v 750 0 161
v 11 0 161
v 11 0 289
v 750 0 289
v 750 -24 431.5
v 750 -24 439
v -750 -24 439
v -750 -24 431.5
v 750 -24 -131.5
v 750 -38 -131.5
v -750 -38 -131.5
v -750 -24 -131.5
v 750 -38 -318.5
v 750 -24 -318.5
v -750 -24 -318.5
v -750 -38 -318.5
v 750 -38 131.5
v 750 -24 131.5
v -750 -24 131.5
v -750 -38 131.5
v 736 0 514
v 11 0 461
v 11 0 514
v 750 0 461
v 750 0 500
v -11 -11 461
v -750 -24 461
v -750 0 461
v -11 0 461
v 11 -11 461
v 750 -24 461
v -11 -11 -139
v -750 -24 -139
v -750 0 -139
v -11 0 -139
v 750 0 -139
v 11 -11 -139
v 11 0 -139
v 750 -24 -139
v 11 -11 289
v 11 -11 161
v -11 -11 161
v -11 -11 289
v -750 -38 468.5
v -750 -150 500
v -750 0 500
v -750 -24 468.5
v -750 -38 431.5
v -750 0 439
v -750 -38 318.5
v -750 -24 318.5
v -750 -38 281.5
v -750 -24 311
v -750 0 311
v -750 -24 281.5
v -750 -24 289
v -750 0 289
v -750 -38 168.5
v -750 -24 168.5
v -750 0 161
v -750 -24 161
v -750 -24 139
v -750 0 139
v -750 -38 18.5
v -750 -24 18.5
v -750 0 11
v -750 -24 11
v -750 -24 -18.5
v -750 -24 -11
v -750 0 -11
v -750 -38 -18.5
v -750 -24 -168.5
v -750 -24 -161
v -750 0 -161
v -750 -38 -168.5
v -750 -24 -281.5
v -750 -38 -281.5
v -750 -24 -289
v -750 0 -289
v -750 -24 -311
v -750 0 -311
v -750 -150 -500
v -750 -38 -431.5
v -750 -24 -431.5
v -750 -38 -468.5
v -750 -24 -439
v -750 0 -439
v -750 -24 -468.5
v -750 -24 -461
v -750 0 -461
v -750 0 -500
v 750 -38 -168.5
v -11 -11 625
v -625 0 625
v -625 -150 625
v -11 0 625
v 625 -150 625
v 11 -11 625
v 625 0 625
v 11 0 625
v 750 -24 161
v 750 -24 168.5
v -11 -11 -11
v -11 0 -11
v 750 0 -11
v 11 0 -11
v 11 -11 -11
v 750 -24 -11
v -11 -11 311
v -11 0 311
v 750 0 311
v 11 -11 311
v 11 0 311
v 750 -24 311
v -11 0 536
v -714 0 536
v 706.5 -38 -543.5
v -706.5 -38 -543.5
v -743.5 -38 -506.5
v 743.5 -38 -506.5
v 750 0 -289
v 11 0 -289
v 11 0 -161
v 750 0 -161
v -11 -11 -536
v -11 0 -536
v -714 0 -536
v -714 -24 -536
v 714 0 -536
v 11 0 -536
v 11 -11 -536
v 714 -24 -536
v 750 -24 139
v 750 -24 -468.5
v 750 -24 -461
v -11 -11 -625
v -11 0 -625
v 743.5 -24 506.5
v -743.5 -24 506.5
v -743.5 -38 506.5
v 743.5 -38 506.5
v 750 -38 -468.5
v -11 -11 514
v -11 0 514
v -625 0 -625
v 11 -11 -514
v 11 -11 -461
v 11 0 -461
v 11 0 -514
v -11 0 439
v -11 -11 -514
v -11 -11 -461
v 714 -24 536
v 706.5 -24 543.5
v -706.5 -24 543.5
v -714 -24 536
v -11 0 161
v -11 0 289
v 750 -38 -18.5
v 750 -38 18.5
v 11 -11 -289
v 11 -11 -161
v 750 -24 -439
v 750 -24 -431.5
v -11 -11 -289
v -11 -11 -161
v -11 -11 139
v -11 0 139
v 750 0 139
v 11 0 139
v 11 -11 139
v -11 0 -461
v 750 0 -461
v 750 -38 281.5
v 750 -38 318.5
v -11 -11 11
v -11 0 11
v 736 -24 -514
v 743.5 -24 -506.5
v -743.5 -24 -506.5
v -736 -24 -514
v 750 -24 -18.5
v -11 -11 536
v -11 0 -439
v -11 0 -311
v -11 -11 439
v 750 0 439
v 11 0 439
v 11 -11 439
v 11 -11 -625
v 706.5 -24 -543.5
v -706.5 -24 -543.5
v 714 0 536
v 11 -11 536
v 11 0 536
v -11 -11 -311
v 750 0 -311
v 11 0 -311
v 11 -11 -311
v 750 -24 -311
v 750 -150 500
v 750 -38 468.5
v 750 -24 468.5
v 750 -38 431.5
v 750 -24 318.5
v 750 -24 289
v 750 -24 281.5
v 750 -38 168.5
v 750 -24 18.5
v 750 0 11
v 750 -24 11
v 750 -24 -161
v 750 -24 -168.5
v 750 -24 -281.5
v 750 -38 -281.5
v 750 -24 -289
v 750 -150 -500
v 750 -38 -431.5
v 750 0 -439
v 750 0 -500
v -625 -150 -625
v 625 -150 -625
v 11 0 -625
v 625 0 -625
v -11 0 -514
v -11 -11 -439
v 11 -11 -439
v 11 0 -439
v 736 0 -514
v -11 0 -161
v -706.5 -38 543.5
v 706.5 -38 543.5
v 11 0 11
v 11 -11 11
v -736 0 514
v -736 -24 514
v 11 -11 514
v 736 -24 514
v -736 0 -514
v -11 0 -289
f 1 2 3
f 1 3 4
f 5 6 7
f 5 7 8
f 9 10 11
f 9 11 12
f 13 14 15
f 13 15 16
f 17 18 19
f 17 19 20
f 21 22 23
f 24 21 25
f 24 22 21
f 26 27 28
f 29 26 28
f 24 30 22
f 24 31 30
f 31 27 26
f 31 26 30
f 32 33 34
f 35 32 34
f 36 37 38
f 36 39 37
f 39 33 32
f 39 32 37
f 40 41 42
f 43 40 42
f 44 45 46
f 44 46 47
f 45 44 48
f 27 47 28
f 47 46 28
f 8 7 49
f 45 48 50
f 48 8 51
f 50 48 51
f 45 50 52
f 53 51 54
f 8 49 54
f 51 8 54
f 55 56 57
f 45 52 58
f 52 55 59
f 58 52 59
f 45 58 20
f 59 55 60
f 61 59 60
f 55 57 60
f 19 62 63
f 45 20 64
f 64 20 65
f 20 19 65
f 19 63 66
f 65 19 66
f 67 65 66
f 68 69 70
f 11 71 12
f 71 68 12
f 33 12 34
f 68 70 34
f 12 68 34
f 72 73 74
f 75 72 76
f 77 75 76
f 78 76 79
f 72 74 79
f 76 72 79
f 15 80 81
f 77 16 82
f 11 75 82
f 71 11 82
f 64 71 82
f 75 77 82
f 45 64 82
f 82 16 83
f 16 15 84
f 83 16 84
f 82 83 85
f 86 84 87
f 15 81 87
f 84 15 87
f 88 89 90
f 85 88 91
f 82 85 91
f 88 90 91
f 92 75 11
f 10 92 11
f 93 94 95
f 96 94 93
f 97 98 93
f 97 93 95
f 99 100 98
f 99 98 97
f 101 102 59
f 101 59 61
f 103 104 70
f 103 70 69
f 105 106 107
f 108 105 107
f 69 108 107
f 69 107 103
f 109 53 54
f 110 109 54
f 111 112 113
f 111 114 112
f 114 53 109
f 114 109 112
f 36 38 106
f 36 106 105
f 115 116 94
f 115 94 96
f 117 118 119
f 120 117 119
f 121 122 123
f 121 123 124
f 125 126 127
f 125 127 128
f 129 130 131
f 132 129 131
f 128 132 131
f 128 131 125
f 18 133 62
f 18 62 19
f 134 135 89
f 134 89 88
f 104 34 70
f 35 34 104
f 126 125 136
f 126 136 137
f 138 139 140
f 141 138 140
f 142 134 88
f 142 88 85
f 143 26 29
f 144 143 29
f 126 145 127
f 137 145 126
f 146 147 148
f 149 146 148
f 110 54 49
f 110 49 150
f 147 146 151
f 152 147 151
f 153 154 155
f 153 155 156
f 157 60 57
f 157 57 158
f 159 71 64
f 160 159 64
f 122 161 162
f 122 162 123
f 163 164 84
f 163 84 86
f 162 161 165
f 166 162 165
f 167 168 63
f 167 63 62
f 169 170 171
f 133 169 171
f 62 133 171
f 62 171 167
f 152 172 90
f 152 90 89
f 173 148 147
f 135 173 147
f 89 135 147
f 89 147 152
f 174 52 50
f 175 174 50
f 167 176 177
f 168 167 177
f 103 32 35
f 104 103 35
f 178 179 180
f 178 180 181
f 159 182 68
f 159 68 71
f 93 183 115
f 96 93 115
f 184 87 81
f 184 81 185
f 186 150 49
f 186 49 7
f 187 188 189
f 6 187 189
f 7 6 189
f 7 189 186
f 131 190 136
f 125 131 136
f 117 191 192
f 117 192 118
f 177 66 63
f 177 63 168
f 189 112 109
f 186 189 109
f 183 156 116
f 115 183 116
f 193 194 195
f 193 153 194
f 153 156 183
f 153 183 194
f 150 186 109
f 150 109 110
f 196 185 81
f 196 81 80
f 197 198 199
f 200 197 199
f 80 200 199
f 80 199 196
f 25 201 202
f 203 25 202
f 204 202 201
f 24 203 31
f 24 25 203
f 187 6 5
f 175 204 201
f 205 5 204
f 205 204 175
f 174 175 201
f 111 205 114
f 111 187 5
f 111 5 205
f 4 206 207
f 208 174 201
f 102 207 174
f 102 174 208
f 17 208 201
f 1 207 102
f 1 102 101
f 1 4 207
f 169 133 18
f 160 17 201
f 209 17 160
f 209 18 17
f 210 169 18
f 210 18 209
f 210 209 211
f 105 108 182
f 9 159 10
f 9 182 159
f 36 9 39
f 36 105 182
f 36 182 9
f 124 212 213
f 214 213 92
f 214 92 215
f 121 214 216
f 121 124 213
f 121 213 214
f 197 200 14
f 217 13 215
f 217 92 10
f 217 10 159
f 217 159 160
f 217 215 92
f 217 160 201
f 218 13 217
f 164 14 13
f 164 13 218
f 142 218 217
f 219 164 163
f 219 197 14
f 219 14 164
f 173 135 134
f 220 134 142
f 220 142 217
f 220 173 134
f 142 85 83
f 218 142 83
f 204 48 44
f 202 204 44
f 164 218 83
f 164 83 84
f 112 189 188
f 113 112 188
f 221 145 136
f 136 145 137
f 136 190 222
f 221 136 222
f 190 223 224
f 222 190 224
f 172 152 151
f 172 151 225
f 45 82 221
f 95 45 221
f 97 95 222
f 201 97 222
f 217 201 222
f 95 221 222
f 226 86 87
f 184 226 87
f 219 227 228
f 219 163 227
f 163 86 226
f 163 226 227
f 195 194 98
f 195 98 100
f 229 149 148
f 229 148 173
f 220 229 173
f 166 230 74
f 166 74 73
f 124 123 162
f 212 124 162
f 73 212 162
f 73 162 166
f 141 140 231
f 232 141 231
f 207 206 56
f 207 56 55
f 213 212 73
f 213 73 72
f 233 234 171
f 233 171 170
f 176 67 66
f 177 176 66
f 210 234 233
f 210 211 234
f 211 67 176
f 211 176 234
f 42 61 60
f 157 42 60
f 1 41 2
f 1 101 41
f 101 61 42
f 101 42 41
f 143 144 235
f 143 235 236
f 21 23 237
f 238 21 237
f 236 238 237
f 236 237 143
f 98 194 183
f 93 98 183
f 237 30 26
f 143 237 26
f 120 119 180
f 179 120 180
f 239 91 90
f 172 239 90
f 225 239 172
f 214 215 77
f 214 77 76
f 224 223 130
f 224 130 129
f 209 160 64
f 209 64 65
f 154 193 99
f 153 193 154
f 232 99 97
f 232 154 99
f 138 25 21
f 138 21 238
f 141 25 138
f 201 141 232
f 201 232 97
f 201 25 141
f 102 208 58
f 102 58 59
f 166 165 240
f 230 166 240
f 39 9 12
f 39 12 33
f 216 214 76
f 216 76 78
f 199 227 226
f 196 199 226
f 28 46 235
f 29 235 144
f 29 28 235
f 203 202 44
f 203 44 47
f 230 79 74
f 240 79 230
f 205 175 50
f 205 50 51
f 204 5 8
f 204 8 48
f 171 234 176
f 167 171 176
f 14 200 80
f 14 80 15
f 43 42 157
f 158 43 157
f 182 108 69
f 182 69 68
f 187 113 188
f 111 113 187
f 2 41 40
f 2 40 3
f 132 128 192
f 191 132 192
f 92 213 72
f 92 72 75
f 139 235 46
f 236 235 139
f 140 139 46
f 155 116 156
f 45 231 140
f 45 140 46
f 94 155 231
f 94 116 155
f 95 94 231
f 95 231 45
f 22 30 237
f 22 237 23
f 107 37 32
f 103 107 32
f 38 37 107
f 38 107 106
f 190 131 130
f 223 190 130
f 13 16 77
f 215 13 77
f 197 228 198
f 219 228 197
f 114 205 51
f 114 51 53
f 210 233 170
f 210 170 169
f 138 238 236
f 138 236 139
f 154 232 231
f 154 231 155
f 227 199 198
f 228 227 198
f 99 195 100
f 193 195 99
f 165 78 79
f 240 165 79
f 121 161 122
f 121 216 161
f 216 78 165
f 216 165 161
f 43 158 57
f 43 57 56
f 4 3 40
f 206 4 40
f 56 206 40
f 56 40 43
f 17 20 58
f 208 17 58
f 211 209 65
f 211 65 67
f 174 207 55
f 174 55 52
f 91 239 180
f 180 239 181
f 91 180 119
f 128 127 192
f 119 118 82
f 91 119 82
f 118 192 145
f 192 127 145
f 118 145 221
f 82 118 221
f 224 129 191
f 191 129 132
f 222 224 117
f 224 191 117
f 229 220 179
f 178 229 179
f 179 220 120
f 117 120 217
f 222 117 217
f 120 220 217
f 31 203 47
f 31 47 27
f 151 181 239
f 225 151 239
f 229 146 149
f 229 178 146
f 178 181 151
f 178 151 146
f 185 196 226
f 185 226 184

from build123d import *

# Parameters (mm, degrees)
SKETCH1_W           = 1500
SKETCH1_H           = 1250
BOSS_EXTRUDE1_DEPTH = 150
CUT_EXTRUDE1_REACH  = 1633.908
LPATTERN1_COUNT     = 4
LPATTERN1_PITCH     = 150
LPATTERN1_COL_COUNT = 4
LPATTERN1_COL_PITCH = 150
CUT_EXTRUDE2_REACH  = 1467.435
SKETCH3_W           = 22
SKETCH3_H           = 11
LPATTERN2_COUNT     = 2
LPATTERN2_PITCH     = 525
LPATTERN2_COL_COUNT = 2
LPATTERN2_COL_PITCH = 525
CHAMFER1_SIZE       = 125


with BuildPart() as part:
    # Sketch1 → Boss-Extrude1 (new body)
    with BuildSketch(Plane(origin=(0, 0, 0), x_dir=(1, 0, 0), z_dir=(0, 1, 0))):
        Rectangle(SKETCH1_W, SKETCH1_H)
    extrude(amount=-BOSS_EXTRUDE1_DEPTH)

    # Sketch2 → Cut-Extrude1 (cut, up to next)
    with BuildSketch(Plane(origin=(750, 0, 0), x_dir=(0, 0, -1), z_dir=(1, 0, 0)), mode=Mode.PRIVATE) as cut_extrude1_sk1:
        Polygon((-11, 0), (11, 0), (11, -24), (18.5, -24), (18.5, -38), (-18.5, -38), (-18.5, -24), (-11, -24), align=None)
    cut_extrude1_tool1 = extrude(cut_extrude1_sk1.sketch, amount=-CUT_EXTRUDE1_REACH, mode=Mode.PRIVATE) & part.part
    cut_extrude1 = cut_extrude1_tool1.solids().sort_by_distance((750, -21.409178, 0))[0]
    add(cut_extrude1, mode=Mode.SUBTRACT)

    # LPattern1: Cut-Extrude1 ×4
    with Locations(*[(0, 0, -i * LPATTERN1_PITCH) for i in range(1, LPATTERN1_COUNT)]):
        add(cut_extrude1, mode=Mode.SUBTRACT)

    # LPattern1 col: Cut-Extrude1 ×4
    with Locations(*[(0, 0, i * LPATTERN1_COL_PITCH) for i in range(1, LPATTERN1_COL_COUNT)]):
        add(cut_extrude1, mode=Mode.SUBTRACT)

    # Cut-Extrude2: up to this face of the body (flat: up to its plane)
    cut_extrude2_end = Plane(part.part.faces().sort_by_distance((0, -75, 625))[0])
    # Sketch3 → Cut-Extrude2 (cut, up to the picked face)
    with BuildSketch(Plane(origin=(0, 0, -625), x_dir=(-1, 0, 0), z_dir=(0, 0, -1)), mode=Mode.PRIVATE) as cut_extrude2_sk1:
        with Locations((0, -5.5)):
            Rectangle(SKETCH3_W, SKETCH3_H)
    cut_extrude2_tool1 = split(extrude(cut_extrude2_sk1.sketch, amount=-CUT_EXTRUDE2_REACH, mode=Mode.PRIVATE), bisect_by=cut_extrude2_end, keep=Keep.BOTH, mode=Mode.PRIVATE)
    add(cut_extrude2_tool1.solids().sort_by(Axis((0, -5.5, -625), (0, 0, 1)))[0], mode=Mode.SUBTRACT)

    # LPattern2: Cut-Extrude1 ×2
    with Locations(*[(0, 0, -i * LPATTERN2_PITCH) for i in range(1, LPATTERN2_COUNT)]):
        add(cut_extrude1, mode=Mode.SUBTRACT)

    # LPattern2 col: Cut-Extrude1 ×2
    with Locations(*[(0, 0, i * LPATTERN2_COL_PITCH) for i in range(1, LPATTERN2_COL_COUNT)]):
        add(cut_extrude1, mode=Mode.SUBTRACT)

    # Chamfer1
    chamfer1_edges = [part.edges().sort_by_distance(p)[0] for p in [
        (-750, -75, 625),
        (-750, -75, -625),
        (750, -75, -625),
        (750, -75, 625),
    ]]
    chamfer(chamfer1_edges, length=CHAMFER1_SIZE)


solid = part.part
